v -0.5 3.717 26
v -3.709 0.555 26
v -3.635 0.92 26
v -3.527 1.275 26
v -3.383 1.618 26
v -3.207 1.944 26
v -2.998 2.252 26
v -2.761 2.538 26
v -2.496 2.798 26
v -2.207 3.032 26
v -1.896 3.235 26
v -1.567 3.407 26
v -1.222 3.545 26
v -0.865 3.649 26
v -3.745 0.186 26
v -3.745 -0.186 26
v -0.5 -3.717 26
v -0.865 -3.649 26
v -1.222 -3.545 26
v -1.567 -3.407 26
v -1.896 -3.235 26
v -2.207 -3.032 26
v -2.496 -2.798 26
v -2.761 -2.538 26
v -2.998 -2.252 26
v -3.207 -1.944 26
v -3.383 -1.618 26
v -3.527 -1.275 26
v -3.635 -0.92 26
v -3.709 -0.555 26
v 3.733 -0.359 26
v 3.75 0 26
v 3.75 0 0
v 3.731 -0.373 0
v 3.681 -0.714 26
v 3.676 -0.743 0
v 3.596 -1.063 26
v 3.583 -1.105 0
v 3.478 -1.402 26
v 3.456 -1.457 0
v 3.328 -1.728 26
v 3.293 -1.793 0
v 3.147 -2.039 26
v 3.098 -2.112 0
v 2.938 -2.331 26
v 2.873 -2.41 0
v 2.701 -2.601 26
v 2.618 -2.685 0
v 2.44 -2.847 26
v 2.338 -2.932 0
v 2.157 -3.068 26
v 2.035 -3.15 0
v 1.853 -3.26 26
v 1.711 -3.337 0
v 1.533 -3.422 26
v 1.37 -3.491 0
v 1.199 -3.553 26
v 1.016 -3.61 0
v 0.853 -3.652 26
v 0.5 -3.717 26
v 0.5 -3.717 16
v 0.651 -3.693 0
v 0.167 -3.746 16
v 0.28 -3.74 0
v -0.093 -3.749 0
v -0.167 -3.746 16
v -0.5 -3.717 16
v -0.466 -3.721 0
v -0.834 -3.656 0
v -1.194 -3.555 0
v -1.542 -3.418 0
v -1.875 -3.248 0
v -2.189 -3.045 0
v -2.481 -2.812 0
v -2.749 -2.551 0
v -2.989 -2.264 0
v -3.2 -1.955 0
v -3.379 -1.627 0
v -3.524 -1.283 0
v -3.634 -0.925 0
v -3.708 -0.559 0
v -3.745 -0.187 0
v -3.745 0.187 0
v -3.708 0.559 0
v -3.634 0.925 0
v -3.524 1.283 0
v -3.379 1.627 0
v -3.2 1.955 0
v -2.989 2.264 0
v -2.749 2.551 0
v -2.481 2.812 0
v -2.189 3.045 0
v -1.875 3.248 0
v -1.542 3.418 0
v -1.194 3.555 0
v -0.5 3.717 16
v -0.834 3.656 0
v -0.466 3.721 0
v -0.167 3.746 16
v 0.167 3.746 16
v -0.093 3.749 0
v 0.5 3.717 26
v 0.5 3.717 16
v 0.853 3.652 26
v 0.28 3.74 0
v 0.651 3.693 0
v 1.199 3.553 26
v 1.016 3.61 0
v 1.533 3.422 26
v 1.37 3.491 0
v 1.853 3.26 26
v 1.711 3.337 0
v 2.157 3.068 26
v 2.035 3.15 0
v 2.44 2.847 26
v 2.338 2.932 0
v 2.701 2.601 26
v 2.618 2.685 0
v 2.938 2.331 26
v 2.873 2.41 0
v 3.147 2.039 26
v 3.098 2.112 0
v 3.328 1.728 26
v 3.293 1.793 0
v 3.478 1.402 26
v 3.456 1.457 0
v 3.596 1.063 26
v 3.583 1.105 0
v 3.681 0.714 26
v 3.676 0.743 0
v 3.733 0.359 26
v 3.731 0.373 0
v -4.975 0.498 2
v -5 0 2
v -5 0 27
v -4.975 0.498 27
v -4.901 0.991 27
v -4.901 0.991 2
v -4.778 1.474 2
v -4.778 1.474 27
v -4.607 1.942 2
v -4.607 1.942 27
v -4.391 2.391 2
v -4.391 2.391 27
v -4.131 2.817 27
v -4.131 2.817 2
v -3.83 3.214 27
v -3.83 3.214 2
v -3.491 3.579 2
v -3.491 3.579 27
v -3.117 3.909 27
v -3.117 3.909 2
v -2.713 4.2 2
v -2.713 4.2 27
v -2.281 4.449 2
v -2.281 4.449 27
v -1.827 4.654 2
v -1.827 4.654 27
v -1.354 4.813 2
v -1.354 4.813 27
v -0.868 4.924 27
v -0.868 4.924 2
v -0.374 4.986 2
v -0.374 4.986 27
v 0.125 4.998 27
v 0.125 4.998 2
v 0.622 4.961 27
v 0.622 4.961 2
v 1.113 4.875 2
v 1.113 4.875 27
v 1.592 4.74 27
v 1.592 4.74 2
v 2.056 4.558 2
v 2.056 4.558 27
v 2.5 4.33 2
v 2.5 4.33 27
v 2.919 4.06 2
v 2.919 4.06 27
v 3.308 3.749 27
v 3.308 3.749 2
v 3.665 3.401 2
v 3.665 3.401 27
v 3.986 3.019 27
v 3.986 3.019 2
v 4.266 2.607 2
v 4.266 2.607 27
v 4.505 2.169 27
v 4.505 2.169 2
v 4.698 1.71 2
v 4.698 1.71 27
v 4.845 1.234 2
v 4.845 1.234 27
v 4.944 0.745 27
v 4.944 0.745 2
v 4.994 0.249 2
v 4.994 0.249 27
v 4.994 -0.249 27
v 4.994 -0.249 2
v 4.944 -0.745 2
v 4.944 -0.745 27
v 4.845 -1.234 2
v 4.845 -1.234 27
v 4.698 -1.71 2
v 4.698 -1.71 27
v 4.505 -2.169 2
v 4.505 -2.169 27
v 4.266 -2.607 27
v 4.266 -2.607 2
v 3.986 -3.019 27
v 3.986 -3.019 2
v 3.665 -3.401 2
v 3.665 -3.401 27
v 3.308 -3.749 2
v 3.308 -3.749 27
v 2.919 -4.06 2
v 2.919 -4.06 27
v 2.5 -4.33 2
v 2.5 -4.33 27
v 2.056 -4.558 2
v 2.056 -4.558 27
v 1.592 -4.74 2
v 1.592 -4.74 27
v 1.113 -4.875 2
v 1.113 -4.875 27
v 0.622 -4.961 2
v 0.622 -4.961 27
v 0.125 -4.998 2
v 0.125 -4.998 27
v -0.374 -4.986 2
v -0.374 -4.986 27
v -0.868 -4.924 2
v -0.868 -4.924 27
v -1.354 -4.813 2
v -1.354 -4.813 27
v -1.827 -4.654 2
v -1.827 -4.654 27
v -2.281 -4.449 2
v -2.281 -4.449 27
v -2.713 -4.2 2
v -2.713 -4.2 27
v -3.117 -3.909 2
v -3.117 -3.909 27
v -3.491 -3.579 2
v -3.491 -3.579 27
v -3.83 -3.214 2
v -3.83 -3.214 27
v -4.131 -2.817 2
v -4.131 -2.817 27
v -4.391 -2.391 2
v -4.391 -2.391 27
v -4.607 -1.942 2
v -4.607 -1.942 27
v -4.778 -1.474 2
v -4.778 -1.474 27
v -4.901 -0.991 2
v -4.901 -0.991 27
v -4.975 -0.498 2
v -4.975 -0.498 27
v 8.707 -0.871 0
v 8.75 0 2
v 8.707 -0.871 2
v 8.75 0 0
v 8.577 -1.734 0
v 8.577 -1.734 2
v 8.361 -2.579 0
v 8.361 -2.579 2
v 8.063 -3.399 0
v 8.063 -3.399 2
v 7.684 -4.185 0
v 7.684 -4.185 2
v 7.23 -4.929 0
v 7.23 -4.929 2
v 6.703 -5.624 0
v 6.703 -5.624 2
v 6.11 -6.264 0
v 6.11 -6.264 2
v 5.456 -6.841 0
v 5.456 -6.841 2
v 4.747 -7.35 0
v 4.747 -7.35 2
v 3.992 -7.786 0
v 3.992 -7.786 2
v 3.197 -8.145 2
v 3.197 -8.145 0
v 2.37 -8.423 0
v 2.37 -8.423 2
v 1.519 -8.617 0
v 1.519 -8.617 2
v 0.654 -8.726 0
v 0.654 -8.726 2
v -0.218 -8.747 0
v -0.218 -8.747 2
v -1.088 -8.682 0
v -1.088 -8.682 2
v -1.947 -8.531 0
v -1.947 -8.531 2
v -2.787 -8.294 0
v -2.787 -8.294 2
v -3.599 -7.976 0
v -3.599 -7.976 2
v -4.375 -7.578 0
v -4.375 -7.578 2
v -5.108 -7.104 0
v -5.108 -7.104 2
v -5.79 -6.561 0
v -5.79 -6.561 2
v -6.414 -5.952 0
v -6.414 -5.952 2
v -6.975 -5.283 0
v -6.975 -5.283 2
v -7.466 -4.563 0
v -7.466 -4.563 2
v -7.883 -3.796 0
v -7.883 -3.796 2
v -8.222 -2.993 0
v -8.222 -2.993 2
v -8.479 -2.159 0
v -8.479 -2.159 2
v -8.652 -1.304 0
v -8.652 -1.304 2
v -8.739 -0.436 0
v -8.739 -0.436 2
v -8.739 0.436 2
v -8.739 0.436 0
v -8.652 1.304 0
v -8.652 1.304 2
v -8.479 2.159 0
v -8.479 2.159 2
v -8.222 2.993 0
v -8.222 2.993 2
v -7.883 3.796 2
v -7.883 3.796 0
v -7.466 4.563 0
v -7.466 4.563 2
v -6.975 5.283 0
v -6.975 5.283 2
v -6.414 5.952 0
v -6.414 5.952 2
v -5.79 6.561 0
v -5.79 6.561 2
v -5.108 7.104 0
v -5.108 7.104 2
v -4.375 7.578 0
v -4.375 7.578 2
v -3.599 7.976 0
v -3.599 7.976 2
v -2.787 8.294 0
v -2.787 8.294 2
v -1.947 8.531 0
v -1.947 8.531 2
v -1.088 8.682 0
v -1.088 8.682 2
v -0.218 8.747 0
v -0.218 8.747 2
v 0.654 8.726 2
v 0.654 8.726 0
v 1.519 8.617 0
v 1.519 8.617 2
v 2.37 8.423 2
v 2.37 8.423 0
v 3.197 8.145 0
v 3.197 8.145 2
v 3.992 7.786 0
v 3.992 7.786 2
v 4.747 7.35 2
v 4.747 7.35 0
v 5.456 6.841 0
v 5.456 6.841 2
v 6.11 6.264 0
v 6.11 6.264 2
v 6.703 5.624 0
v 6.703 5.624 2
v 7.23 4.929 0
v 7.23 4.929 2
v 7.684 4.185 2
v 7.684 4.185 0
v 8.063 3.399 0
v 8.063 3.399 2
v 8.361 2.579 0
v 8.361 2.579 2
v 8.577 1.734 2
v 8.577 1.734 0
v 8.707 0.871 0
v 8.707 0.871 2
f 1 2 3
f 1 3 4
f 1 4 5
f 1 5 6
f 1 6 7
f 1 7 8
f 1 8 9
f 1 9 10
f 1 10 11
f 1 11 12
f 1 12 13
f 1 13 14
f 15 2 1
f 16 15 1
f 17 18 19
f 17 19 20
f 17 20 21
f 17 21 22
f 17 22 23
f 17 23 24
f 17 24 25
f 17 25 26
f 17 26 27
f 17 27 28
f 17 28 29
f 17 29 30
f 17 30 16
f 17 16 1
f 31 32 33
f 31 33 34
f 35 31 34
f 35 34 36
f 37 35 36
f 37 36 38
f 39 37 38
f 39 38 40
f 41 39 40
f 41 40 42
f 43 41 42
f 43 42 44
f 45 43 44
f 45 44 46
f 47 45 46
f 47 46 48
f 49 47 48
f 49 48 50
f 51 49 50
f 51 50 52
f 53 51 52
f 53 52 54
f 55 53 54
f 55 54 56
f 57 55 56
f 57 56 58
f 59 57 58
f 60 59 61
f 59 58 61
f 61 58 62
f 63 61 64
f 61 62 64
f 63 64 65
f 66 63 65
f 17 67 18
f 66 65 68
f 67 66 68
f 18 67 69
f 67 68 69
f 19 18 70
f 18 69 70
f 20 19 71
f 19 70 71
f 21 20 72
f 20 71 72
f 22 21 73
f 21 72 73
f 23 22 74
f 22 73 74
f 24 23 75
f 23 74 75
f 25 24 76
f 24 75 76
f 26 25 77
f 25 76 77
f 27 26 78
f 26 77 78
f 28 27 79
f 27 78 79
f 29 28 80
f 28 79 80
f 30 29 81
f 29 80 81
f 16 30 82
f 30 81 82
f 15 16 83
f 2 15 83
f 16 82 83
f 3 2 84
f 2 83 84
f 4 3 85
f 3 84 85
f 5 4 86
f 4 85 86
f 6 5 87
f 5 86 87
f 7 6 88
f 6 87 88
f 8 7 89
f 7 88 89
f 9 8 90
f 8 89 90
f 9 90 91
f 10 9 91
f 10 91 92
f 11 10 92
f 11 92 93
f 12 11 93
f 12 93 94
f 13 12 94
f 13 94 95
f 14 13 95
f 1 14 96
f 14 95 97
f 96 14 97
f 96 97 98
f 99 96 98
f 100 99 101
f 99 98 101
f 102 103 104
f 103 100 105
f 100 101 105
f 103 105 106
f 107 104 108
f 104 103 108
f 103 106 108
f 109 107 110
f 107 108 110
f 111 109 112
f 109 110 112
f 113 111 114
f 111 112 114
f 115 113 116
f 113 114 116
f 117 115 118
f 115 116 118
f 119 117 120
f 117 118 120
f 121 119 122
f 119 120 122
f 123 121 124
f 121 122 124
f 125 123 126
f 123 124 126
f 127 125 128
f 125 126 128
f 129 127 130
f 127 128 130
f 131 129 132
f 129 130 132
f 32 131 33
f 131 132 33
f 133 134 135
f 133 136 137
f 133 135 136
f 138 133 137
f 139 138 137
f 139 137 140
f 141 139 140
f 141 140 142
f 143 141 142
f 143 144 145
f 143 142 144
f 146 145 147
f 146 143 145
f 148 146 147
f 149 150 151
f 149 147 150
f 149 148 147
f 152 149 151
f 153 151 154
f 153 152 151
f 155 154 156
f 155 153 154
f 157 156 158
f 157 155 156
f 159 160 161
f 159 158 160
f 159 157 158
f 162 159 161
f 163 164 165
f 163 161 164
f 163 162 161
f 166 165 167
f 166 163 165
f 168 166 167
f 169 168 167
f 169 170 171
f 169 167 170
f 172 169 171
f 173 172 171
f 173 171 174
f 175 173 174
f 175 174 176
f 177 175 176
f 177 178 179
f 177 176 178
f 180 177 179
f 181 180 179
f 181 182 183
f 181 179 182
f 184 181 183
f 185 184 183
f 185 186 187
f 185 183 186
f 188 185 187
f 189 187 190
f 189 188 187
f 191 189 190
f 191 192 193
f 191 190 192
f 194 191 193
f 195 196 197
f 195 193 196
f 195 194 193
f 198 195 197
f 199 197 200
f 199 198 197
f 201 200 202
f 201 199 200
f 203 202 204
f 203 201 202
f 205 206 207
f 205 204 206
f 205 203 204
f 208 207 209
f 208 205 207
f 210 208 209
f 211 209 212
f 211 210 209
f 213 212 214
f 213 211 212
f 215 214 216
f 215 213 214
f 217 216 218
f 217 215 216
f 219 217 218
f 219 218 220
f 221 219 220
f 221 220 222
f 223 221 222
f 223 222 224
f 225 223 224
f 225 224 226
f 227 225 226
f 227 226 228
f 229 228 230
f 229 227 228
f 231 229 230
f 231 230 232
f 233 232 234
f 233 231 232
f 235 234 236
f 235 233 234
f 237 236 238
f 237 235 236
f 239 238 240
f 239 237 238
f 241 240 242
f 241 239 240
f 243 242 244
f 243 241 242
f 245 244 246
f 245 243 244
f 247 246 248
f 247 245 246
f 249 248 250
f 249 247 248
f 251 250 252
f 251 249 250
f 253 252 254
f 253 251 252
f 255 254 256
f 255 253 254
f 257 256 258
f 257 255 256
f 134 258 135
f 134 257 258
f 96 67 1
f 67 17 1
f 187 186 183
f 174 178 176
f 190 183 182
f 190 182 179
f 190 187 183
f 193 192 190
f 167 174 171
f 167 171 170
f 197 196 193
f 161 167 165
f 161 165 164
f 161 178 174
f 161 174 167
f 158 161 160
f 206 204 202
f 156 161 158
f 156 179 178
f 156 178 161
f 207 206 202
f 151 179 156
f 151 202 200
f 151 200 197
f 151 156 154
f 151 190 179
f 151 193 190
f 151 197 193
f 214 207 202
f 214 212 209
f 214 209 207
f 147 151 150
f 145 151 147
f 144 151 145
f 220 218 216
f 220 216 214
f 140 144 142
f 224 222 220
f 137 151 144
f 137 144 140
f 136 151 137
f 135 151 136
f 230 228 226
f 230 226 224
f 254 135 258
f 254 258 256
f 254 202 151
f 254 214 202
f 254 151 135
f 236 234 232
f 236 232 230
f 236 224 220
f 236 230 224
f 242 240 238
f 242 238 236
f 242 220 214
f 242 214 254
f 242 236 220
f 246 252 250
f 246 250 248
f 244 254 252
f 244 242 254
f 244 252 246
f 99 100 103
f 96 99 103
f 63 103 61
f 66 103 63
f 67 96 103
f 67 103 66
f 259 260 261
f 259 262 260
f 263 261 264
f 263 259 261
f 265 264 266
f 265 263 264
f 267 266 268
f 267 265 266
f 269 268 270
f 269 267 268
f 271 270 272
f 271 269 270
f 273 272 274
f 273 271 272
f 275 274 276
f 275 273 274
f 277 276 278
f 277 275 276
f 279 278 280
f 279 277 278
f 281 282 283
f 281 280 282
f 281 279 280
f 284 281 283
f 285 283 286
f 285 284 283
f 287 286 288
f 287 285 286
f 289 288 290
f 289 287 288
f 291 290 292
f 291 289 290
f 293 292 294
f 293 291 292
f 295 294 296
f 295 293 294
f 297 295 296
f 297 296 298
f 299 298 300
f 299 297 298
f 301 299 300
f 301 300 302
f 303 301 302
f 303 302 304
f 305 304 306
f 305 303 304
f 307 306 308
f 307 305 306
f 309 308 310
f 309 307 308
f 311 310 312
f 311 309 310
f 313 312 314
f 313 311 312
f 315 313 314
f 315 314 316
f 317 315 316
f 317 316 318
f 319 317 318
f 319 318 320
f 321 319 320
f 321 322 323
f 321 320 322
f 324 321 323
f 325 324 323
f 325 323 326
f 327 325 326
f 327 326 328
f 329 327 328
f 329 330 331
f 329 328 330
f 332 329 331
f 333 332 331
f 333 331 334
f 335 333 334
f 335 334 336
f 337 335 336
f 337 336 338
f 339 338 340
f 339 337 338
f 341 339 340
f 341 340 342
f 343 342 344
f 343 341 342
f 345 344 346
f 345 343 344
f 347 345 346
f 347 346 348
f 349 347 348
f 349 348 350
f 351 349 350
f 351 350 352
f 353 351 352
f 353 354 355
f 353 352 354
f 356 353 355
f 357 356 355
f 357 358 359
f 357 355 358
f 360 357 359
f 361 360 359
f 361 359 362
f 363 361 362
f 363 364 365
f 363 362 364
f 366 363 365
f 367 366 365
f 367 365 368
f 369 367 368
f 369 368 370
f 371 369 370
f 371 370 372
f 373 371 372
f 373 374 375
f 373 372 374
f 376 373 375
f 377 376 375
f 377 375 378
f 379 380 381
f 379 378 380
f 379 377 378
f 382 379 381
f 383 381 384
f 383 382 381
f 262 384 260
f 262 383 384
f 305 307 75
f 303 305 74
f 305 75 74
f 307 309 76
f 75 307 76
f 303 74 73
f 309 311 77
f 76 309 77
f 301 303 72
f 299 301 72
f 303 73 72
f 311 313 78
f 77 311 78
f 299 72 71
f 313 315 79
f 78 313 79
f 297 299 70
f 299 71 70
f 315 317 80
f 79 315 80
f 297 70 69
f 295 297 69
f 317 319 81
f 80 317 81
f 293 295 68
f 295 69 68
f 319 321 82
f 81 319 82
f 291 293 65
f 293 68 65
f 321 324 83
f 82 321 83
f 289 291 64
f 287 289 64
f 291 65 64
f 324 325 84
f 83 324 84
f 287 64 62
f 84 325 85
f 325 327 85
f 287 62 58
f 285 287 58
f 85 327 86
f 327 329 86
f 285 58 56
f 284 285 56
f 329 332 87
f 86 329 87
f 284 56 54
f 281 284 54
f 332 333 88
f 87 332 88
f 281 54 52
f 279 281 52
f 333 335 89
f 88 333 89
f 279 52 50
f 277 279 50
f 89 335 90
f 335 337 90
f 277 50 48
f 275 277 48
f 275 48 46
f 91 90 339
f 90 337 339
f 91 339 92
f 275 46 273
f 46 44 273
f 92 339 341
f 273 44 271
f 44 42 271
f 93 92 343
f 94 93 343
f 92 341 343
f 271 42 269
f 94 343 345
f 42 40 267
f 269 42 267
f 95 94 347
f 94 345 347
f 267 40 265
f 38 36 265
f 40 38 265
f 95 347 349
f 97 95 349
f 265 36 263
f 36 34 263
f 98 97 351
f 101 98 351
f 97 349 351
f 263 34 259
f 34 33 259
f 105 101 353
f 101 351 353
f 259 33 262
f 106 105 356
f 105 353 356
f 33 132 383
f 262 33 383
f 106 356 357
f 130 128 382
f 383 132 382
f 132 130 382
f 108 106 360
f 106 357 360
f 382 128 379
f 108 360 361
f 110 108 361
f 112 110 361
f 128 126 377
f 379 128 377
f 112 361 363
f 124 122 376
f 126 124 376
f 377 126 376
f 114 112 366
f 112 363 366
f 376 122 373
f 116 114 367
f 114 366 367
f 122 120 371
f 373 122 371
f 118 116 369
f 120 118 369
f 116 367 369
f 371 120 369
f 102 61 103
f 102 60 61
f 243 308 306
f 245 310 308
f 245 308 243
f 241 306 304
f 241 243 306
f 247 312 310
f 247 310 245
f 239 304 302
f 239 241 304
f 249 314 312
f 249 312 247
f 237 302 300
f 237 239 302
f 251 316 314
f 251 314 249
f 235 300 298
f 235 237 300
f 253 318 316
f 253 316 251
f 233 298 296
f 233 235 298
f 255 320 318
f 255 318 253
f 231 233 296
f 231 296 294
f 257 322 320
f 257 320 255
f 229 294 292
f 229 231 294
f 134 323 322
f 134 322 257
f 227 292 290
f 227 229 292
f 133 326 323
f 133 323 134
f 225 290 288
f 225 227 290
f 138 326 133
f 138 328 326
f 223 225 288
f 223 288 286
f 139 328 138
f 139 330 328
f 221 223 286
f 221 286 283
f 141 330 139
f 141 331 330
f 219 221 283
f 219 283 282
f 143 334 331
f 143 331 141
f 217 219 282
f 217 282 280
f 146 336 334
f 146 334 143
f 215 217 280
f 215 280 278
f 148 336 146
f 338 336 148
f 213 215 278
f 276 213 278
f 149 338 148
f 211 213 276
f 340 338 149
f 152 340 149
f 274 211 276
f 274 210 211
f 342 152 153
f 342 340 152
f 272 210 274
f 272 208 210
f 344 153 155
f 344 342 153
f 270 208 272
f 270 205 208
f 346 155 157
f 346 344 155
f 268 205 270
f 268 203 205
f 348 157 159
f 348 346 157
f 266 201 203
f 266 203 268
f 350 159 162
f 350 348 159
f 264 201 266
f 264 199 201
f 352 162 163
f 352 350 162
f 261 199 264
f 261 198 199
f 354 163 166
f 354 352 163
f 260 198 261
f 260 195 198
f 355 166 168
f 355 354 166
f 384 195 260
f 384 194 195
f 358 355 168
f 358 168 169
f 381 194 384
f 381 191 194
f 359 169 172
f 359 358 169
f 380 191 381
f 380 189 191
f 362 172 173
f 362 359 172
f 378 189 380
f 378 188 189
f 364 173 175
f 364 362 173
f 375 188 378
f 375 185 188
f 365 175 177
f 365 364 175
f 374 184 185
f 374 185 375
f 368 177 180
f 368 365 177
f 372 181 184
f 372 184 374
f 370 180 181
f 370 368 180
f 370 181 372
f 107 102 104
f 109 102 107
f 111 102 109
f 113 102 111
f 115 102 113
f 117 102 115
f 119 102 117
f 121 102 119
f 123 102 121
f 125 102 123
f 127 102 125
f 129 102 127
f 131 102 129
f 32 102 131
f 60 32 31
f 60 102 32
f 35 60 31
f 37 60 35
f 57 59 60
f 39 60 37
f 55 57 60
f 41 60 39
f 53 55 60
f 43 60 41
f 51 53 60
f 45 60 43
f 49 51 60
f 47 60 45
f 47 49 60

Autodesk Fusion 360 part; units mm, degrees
sketch "Sketch1" plane through (0, 0, 0) normal (0, 0, 1) x (1, 0, 0)
  circle A0 centre (0, 0) radius 8.75
  dimension "d1" = 17.5
extrude "Extrude1" add sketch "Sketch1" along normal blind 2
sketch "Sketch2" plane through (0, 0, 2) normal (0, 0, 1) x (-1, 0, 0)
  circle A0 centre (0, 0) radius 8.75
  circle A1 centre (0, 0) radius 5
  dimension "d4" = 10
extrude "Extrude2" add sketch "Sketch2" along normal blind 25 contours A1
sketch "Sketch3" plane through (0, 0, 0) normal (0, 0, -1) x (1, 0, 0)
  circle A0 centre (0, 0) radius 8.75
  circle A1 centre (0, 0) radius 3.75
  dimension "d7" = 7.5
extrude "Extrude3" cut sketch "Sketch3" against normal blind 26 contours A1
sketch "Sketch4" plane through (0, 0, 0) normal (0, 0, 1) x (1, 0, 0)
sketch "Sketch5" plane through (0, 0, 0) normal (1, 0, 0) x (0, 1, 0)
  line L0 (-3.75, 26) -> (3.75, 26)
  line L1 (3.75, 26) -> (3.75, 16)
  line L2 (3.75, 16) -> (-3.75, 16)
  line L3 (-3.75, 16) -> (-3.75, 26)
  dimension "d10" = 7.5
  dimension "d11" = 10
extrude "Extrude4" add sketch "Sketch5" along normal mid plane 1
